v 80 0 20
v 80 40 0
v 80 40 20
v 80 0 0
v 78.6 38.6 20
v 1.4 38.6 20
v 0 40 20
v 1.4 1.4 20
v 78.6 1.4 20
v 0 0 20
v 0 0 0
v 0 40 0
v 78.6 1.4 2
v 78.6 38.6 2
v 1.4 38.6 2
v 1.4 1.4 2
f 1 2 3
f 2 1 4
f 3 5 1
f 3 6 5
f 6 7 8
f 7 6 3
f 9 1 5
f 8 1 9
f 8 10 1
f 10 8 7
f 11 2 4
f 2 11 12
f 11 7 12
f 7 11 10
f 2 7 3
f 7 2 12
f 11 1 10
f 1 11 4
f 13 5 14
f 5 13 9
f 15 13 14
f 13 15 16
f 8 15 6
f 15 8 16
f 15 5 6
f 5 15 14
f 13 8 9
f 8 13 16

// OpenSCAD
$fn = 32;

// ----------------------------------------------------------------------
// Open box: 1.4 mm walls
// ----------------------------------------------------------------------

// --- parameters (mm) ---
box_l = 80;               // outer length, X
box_w = 40;               // outer width, Y
box_h = 20;               // outer height, Z
wall = 1.4;               // wall thickness
floor = 2;                // floor thickness

difference() {
  cube([box_l, box_w, box_h]);
  translate([wall, wall, floor])
    cube([box_l - 2 * wall, box_w - 2 * wall, box_h]);
}
